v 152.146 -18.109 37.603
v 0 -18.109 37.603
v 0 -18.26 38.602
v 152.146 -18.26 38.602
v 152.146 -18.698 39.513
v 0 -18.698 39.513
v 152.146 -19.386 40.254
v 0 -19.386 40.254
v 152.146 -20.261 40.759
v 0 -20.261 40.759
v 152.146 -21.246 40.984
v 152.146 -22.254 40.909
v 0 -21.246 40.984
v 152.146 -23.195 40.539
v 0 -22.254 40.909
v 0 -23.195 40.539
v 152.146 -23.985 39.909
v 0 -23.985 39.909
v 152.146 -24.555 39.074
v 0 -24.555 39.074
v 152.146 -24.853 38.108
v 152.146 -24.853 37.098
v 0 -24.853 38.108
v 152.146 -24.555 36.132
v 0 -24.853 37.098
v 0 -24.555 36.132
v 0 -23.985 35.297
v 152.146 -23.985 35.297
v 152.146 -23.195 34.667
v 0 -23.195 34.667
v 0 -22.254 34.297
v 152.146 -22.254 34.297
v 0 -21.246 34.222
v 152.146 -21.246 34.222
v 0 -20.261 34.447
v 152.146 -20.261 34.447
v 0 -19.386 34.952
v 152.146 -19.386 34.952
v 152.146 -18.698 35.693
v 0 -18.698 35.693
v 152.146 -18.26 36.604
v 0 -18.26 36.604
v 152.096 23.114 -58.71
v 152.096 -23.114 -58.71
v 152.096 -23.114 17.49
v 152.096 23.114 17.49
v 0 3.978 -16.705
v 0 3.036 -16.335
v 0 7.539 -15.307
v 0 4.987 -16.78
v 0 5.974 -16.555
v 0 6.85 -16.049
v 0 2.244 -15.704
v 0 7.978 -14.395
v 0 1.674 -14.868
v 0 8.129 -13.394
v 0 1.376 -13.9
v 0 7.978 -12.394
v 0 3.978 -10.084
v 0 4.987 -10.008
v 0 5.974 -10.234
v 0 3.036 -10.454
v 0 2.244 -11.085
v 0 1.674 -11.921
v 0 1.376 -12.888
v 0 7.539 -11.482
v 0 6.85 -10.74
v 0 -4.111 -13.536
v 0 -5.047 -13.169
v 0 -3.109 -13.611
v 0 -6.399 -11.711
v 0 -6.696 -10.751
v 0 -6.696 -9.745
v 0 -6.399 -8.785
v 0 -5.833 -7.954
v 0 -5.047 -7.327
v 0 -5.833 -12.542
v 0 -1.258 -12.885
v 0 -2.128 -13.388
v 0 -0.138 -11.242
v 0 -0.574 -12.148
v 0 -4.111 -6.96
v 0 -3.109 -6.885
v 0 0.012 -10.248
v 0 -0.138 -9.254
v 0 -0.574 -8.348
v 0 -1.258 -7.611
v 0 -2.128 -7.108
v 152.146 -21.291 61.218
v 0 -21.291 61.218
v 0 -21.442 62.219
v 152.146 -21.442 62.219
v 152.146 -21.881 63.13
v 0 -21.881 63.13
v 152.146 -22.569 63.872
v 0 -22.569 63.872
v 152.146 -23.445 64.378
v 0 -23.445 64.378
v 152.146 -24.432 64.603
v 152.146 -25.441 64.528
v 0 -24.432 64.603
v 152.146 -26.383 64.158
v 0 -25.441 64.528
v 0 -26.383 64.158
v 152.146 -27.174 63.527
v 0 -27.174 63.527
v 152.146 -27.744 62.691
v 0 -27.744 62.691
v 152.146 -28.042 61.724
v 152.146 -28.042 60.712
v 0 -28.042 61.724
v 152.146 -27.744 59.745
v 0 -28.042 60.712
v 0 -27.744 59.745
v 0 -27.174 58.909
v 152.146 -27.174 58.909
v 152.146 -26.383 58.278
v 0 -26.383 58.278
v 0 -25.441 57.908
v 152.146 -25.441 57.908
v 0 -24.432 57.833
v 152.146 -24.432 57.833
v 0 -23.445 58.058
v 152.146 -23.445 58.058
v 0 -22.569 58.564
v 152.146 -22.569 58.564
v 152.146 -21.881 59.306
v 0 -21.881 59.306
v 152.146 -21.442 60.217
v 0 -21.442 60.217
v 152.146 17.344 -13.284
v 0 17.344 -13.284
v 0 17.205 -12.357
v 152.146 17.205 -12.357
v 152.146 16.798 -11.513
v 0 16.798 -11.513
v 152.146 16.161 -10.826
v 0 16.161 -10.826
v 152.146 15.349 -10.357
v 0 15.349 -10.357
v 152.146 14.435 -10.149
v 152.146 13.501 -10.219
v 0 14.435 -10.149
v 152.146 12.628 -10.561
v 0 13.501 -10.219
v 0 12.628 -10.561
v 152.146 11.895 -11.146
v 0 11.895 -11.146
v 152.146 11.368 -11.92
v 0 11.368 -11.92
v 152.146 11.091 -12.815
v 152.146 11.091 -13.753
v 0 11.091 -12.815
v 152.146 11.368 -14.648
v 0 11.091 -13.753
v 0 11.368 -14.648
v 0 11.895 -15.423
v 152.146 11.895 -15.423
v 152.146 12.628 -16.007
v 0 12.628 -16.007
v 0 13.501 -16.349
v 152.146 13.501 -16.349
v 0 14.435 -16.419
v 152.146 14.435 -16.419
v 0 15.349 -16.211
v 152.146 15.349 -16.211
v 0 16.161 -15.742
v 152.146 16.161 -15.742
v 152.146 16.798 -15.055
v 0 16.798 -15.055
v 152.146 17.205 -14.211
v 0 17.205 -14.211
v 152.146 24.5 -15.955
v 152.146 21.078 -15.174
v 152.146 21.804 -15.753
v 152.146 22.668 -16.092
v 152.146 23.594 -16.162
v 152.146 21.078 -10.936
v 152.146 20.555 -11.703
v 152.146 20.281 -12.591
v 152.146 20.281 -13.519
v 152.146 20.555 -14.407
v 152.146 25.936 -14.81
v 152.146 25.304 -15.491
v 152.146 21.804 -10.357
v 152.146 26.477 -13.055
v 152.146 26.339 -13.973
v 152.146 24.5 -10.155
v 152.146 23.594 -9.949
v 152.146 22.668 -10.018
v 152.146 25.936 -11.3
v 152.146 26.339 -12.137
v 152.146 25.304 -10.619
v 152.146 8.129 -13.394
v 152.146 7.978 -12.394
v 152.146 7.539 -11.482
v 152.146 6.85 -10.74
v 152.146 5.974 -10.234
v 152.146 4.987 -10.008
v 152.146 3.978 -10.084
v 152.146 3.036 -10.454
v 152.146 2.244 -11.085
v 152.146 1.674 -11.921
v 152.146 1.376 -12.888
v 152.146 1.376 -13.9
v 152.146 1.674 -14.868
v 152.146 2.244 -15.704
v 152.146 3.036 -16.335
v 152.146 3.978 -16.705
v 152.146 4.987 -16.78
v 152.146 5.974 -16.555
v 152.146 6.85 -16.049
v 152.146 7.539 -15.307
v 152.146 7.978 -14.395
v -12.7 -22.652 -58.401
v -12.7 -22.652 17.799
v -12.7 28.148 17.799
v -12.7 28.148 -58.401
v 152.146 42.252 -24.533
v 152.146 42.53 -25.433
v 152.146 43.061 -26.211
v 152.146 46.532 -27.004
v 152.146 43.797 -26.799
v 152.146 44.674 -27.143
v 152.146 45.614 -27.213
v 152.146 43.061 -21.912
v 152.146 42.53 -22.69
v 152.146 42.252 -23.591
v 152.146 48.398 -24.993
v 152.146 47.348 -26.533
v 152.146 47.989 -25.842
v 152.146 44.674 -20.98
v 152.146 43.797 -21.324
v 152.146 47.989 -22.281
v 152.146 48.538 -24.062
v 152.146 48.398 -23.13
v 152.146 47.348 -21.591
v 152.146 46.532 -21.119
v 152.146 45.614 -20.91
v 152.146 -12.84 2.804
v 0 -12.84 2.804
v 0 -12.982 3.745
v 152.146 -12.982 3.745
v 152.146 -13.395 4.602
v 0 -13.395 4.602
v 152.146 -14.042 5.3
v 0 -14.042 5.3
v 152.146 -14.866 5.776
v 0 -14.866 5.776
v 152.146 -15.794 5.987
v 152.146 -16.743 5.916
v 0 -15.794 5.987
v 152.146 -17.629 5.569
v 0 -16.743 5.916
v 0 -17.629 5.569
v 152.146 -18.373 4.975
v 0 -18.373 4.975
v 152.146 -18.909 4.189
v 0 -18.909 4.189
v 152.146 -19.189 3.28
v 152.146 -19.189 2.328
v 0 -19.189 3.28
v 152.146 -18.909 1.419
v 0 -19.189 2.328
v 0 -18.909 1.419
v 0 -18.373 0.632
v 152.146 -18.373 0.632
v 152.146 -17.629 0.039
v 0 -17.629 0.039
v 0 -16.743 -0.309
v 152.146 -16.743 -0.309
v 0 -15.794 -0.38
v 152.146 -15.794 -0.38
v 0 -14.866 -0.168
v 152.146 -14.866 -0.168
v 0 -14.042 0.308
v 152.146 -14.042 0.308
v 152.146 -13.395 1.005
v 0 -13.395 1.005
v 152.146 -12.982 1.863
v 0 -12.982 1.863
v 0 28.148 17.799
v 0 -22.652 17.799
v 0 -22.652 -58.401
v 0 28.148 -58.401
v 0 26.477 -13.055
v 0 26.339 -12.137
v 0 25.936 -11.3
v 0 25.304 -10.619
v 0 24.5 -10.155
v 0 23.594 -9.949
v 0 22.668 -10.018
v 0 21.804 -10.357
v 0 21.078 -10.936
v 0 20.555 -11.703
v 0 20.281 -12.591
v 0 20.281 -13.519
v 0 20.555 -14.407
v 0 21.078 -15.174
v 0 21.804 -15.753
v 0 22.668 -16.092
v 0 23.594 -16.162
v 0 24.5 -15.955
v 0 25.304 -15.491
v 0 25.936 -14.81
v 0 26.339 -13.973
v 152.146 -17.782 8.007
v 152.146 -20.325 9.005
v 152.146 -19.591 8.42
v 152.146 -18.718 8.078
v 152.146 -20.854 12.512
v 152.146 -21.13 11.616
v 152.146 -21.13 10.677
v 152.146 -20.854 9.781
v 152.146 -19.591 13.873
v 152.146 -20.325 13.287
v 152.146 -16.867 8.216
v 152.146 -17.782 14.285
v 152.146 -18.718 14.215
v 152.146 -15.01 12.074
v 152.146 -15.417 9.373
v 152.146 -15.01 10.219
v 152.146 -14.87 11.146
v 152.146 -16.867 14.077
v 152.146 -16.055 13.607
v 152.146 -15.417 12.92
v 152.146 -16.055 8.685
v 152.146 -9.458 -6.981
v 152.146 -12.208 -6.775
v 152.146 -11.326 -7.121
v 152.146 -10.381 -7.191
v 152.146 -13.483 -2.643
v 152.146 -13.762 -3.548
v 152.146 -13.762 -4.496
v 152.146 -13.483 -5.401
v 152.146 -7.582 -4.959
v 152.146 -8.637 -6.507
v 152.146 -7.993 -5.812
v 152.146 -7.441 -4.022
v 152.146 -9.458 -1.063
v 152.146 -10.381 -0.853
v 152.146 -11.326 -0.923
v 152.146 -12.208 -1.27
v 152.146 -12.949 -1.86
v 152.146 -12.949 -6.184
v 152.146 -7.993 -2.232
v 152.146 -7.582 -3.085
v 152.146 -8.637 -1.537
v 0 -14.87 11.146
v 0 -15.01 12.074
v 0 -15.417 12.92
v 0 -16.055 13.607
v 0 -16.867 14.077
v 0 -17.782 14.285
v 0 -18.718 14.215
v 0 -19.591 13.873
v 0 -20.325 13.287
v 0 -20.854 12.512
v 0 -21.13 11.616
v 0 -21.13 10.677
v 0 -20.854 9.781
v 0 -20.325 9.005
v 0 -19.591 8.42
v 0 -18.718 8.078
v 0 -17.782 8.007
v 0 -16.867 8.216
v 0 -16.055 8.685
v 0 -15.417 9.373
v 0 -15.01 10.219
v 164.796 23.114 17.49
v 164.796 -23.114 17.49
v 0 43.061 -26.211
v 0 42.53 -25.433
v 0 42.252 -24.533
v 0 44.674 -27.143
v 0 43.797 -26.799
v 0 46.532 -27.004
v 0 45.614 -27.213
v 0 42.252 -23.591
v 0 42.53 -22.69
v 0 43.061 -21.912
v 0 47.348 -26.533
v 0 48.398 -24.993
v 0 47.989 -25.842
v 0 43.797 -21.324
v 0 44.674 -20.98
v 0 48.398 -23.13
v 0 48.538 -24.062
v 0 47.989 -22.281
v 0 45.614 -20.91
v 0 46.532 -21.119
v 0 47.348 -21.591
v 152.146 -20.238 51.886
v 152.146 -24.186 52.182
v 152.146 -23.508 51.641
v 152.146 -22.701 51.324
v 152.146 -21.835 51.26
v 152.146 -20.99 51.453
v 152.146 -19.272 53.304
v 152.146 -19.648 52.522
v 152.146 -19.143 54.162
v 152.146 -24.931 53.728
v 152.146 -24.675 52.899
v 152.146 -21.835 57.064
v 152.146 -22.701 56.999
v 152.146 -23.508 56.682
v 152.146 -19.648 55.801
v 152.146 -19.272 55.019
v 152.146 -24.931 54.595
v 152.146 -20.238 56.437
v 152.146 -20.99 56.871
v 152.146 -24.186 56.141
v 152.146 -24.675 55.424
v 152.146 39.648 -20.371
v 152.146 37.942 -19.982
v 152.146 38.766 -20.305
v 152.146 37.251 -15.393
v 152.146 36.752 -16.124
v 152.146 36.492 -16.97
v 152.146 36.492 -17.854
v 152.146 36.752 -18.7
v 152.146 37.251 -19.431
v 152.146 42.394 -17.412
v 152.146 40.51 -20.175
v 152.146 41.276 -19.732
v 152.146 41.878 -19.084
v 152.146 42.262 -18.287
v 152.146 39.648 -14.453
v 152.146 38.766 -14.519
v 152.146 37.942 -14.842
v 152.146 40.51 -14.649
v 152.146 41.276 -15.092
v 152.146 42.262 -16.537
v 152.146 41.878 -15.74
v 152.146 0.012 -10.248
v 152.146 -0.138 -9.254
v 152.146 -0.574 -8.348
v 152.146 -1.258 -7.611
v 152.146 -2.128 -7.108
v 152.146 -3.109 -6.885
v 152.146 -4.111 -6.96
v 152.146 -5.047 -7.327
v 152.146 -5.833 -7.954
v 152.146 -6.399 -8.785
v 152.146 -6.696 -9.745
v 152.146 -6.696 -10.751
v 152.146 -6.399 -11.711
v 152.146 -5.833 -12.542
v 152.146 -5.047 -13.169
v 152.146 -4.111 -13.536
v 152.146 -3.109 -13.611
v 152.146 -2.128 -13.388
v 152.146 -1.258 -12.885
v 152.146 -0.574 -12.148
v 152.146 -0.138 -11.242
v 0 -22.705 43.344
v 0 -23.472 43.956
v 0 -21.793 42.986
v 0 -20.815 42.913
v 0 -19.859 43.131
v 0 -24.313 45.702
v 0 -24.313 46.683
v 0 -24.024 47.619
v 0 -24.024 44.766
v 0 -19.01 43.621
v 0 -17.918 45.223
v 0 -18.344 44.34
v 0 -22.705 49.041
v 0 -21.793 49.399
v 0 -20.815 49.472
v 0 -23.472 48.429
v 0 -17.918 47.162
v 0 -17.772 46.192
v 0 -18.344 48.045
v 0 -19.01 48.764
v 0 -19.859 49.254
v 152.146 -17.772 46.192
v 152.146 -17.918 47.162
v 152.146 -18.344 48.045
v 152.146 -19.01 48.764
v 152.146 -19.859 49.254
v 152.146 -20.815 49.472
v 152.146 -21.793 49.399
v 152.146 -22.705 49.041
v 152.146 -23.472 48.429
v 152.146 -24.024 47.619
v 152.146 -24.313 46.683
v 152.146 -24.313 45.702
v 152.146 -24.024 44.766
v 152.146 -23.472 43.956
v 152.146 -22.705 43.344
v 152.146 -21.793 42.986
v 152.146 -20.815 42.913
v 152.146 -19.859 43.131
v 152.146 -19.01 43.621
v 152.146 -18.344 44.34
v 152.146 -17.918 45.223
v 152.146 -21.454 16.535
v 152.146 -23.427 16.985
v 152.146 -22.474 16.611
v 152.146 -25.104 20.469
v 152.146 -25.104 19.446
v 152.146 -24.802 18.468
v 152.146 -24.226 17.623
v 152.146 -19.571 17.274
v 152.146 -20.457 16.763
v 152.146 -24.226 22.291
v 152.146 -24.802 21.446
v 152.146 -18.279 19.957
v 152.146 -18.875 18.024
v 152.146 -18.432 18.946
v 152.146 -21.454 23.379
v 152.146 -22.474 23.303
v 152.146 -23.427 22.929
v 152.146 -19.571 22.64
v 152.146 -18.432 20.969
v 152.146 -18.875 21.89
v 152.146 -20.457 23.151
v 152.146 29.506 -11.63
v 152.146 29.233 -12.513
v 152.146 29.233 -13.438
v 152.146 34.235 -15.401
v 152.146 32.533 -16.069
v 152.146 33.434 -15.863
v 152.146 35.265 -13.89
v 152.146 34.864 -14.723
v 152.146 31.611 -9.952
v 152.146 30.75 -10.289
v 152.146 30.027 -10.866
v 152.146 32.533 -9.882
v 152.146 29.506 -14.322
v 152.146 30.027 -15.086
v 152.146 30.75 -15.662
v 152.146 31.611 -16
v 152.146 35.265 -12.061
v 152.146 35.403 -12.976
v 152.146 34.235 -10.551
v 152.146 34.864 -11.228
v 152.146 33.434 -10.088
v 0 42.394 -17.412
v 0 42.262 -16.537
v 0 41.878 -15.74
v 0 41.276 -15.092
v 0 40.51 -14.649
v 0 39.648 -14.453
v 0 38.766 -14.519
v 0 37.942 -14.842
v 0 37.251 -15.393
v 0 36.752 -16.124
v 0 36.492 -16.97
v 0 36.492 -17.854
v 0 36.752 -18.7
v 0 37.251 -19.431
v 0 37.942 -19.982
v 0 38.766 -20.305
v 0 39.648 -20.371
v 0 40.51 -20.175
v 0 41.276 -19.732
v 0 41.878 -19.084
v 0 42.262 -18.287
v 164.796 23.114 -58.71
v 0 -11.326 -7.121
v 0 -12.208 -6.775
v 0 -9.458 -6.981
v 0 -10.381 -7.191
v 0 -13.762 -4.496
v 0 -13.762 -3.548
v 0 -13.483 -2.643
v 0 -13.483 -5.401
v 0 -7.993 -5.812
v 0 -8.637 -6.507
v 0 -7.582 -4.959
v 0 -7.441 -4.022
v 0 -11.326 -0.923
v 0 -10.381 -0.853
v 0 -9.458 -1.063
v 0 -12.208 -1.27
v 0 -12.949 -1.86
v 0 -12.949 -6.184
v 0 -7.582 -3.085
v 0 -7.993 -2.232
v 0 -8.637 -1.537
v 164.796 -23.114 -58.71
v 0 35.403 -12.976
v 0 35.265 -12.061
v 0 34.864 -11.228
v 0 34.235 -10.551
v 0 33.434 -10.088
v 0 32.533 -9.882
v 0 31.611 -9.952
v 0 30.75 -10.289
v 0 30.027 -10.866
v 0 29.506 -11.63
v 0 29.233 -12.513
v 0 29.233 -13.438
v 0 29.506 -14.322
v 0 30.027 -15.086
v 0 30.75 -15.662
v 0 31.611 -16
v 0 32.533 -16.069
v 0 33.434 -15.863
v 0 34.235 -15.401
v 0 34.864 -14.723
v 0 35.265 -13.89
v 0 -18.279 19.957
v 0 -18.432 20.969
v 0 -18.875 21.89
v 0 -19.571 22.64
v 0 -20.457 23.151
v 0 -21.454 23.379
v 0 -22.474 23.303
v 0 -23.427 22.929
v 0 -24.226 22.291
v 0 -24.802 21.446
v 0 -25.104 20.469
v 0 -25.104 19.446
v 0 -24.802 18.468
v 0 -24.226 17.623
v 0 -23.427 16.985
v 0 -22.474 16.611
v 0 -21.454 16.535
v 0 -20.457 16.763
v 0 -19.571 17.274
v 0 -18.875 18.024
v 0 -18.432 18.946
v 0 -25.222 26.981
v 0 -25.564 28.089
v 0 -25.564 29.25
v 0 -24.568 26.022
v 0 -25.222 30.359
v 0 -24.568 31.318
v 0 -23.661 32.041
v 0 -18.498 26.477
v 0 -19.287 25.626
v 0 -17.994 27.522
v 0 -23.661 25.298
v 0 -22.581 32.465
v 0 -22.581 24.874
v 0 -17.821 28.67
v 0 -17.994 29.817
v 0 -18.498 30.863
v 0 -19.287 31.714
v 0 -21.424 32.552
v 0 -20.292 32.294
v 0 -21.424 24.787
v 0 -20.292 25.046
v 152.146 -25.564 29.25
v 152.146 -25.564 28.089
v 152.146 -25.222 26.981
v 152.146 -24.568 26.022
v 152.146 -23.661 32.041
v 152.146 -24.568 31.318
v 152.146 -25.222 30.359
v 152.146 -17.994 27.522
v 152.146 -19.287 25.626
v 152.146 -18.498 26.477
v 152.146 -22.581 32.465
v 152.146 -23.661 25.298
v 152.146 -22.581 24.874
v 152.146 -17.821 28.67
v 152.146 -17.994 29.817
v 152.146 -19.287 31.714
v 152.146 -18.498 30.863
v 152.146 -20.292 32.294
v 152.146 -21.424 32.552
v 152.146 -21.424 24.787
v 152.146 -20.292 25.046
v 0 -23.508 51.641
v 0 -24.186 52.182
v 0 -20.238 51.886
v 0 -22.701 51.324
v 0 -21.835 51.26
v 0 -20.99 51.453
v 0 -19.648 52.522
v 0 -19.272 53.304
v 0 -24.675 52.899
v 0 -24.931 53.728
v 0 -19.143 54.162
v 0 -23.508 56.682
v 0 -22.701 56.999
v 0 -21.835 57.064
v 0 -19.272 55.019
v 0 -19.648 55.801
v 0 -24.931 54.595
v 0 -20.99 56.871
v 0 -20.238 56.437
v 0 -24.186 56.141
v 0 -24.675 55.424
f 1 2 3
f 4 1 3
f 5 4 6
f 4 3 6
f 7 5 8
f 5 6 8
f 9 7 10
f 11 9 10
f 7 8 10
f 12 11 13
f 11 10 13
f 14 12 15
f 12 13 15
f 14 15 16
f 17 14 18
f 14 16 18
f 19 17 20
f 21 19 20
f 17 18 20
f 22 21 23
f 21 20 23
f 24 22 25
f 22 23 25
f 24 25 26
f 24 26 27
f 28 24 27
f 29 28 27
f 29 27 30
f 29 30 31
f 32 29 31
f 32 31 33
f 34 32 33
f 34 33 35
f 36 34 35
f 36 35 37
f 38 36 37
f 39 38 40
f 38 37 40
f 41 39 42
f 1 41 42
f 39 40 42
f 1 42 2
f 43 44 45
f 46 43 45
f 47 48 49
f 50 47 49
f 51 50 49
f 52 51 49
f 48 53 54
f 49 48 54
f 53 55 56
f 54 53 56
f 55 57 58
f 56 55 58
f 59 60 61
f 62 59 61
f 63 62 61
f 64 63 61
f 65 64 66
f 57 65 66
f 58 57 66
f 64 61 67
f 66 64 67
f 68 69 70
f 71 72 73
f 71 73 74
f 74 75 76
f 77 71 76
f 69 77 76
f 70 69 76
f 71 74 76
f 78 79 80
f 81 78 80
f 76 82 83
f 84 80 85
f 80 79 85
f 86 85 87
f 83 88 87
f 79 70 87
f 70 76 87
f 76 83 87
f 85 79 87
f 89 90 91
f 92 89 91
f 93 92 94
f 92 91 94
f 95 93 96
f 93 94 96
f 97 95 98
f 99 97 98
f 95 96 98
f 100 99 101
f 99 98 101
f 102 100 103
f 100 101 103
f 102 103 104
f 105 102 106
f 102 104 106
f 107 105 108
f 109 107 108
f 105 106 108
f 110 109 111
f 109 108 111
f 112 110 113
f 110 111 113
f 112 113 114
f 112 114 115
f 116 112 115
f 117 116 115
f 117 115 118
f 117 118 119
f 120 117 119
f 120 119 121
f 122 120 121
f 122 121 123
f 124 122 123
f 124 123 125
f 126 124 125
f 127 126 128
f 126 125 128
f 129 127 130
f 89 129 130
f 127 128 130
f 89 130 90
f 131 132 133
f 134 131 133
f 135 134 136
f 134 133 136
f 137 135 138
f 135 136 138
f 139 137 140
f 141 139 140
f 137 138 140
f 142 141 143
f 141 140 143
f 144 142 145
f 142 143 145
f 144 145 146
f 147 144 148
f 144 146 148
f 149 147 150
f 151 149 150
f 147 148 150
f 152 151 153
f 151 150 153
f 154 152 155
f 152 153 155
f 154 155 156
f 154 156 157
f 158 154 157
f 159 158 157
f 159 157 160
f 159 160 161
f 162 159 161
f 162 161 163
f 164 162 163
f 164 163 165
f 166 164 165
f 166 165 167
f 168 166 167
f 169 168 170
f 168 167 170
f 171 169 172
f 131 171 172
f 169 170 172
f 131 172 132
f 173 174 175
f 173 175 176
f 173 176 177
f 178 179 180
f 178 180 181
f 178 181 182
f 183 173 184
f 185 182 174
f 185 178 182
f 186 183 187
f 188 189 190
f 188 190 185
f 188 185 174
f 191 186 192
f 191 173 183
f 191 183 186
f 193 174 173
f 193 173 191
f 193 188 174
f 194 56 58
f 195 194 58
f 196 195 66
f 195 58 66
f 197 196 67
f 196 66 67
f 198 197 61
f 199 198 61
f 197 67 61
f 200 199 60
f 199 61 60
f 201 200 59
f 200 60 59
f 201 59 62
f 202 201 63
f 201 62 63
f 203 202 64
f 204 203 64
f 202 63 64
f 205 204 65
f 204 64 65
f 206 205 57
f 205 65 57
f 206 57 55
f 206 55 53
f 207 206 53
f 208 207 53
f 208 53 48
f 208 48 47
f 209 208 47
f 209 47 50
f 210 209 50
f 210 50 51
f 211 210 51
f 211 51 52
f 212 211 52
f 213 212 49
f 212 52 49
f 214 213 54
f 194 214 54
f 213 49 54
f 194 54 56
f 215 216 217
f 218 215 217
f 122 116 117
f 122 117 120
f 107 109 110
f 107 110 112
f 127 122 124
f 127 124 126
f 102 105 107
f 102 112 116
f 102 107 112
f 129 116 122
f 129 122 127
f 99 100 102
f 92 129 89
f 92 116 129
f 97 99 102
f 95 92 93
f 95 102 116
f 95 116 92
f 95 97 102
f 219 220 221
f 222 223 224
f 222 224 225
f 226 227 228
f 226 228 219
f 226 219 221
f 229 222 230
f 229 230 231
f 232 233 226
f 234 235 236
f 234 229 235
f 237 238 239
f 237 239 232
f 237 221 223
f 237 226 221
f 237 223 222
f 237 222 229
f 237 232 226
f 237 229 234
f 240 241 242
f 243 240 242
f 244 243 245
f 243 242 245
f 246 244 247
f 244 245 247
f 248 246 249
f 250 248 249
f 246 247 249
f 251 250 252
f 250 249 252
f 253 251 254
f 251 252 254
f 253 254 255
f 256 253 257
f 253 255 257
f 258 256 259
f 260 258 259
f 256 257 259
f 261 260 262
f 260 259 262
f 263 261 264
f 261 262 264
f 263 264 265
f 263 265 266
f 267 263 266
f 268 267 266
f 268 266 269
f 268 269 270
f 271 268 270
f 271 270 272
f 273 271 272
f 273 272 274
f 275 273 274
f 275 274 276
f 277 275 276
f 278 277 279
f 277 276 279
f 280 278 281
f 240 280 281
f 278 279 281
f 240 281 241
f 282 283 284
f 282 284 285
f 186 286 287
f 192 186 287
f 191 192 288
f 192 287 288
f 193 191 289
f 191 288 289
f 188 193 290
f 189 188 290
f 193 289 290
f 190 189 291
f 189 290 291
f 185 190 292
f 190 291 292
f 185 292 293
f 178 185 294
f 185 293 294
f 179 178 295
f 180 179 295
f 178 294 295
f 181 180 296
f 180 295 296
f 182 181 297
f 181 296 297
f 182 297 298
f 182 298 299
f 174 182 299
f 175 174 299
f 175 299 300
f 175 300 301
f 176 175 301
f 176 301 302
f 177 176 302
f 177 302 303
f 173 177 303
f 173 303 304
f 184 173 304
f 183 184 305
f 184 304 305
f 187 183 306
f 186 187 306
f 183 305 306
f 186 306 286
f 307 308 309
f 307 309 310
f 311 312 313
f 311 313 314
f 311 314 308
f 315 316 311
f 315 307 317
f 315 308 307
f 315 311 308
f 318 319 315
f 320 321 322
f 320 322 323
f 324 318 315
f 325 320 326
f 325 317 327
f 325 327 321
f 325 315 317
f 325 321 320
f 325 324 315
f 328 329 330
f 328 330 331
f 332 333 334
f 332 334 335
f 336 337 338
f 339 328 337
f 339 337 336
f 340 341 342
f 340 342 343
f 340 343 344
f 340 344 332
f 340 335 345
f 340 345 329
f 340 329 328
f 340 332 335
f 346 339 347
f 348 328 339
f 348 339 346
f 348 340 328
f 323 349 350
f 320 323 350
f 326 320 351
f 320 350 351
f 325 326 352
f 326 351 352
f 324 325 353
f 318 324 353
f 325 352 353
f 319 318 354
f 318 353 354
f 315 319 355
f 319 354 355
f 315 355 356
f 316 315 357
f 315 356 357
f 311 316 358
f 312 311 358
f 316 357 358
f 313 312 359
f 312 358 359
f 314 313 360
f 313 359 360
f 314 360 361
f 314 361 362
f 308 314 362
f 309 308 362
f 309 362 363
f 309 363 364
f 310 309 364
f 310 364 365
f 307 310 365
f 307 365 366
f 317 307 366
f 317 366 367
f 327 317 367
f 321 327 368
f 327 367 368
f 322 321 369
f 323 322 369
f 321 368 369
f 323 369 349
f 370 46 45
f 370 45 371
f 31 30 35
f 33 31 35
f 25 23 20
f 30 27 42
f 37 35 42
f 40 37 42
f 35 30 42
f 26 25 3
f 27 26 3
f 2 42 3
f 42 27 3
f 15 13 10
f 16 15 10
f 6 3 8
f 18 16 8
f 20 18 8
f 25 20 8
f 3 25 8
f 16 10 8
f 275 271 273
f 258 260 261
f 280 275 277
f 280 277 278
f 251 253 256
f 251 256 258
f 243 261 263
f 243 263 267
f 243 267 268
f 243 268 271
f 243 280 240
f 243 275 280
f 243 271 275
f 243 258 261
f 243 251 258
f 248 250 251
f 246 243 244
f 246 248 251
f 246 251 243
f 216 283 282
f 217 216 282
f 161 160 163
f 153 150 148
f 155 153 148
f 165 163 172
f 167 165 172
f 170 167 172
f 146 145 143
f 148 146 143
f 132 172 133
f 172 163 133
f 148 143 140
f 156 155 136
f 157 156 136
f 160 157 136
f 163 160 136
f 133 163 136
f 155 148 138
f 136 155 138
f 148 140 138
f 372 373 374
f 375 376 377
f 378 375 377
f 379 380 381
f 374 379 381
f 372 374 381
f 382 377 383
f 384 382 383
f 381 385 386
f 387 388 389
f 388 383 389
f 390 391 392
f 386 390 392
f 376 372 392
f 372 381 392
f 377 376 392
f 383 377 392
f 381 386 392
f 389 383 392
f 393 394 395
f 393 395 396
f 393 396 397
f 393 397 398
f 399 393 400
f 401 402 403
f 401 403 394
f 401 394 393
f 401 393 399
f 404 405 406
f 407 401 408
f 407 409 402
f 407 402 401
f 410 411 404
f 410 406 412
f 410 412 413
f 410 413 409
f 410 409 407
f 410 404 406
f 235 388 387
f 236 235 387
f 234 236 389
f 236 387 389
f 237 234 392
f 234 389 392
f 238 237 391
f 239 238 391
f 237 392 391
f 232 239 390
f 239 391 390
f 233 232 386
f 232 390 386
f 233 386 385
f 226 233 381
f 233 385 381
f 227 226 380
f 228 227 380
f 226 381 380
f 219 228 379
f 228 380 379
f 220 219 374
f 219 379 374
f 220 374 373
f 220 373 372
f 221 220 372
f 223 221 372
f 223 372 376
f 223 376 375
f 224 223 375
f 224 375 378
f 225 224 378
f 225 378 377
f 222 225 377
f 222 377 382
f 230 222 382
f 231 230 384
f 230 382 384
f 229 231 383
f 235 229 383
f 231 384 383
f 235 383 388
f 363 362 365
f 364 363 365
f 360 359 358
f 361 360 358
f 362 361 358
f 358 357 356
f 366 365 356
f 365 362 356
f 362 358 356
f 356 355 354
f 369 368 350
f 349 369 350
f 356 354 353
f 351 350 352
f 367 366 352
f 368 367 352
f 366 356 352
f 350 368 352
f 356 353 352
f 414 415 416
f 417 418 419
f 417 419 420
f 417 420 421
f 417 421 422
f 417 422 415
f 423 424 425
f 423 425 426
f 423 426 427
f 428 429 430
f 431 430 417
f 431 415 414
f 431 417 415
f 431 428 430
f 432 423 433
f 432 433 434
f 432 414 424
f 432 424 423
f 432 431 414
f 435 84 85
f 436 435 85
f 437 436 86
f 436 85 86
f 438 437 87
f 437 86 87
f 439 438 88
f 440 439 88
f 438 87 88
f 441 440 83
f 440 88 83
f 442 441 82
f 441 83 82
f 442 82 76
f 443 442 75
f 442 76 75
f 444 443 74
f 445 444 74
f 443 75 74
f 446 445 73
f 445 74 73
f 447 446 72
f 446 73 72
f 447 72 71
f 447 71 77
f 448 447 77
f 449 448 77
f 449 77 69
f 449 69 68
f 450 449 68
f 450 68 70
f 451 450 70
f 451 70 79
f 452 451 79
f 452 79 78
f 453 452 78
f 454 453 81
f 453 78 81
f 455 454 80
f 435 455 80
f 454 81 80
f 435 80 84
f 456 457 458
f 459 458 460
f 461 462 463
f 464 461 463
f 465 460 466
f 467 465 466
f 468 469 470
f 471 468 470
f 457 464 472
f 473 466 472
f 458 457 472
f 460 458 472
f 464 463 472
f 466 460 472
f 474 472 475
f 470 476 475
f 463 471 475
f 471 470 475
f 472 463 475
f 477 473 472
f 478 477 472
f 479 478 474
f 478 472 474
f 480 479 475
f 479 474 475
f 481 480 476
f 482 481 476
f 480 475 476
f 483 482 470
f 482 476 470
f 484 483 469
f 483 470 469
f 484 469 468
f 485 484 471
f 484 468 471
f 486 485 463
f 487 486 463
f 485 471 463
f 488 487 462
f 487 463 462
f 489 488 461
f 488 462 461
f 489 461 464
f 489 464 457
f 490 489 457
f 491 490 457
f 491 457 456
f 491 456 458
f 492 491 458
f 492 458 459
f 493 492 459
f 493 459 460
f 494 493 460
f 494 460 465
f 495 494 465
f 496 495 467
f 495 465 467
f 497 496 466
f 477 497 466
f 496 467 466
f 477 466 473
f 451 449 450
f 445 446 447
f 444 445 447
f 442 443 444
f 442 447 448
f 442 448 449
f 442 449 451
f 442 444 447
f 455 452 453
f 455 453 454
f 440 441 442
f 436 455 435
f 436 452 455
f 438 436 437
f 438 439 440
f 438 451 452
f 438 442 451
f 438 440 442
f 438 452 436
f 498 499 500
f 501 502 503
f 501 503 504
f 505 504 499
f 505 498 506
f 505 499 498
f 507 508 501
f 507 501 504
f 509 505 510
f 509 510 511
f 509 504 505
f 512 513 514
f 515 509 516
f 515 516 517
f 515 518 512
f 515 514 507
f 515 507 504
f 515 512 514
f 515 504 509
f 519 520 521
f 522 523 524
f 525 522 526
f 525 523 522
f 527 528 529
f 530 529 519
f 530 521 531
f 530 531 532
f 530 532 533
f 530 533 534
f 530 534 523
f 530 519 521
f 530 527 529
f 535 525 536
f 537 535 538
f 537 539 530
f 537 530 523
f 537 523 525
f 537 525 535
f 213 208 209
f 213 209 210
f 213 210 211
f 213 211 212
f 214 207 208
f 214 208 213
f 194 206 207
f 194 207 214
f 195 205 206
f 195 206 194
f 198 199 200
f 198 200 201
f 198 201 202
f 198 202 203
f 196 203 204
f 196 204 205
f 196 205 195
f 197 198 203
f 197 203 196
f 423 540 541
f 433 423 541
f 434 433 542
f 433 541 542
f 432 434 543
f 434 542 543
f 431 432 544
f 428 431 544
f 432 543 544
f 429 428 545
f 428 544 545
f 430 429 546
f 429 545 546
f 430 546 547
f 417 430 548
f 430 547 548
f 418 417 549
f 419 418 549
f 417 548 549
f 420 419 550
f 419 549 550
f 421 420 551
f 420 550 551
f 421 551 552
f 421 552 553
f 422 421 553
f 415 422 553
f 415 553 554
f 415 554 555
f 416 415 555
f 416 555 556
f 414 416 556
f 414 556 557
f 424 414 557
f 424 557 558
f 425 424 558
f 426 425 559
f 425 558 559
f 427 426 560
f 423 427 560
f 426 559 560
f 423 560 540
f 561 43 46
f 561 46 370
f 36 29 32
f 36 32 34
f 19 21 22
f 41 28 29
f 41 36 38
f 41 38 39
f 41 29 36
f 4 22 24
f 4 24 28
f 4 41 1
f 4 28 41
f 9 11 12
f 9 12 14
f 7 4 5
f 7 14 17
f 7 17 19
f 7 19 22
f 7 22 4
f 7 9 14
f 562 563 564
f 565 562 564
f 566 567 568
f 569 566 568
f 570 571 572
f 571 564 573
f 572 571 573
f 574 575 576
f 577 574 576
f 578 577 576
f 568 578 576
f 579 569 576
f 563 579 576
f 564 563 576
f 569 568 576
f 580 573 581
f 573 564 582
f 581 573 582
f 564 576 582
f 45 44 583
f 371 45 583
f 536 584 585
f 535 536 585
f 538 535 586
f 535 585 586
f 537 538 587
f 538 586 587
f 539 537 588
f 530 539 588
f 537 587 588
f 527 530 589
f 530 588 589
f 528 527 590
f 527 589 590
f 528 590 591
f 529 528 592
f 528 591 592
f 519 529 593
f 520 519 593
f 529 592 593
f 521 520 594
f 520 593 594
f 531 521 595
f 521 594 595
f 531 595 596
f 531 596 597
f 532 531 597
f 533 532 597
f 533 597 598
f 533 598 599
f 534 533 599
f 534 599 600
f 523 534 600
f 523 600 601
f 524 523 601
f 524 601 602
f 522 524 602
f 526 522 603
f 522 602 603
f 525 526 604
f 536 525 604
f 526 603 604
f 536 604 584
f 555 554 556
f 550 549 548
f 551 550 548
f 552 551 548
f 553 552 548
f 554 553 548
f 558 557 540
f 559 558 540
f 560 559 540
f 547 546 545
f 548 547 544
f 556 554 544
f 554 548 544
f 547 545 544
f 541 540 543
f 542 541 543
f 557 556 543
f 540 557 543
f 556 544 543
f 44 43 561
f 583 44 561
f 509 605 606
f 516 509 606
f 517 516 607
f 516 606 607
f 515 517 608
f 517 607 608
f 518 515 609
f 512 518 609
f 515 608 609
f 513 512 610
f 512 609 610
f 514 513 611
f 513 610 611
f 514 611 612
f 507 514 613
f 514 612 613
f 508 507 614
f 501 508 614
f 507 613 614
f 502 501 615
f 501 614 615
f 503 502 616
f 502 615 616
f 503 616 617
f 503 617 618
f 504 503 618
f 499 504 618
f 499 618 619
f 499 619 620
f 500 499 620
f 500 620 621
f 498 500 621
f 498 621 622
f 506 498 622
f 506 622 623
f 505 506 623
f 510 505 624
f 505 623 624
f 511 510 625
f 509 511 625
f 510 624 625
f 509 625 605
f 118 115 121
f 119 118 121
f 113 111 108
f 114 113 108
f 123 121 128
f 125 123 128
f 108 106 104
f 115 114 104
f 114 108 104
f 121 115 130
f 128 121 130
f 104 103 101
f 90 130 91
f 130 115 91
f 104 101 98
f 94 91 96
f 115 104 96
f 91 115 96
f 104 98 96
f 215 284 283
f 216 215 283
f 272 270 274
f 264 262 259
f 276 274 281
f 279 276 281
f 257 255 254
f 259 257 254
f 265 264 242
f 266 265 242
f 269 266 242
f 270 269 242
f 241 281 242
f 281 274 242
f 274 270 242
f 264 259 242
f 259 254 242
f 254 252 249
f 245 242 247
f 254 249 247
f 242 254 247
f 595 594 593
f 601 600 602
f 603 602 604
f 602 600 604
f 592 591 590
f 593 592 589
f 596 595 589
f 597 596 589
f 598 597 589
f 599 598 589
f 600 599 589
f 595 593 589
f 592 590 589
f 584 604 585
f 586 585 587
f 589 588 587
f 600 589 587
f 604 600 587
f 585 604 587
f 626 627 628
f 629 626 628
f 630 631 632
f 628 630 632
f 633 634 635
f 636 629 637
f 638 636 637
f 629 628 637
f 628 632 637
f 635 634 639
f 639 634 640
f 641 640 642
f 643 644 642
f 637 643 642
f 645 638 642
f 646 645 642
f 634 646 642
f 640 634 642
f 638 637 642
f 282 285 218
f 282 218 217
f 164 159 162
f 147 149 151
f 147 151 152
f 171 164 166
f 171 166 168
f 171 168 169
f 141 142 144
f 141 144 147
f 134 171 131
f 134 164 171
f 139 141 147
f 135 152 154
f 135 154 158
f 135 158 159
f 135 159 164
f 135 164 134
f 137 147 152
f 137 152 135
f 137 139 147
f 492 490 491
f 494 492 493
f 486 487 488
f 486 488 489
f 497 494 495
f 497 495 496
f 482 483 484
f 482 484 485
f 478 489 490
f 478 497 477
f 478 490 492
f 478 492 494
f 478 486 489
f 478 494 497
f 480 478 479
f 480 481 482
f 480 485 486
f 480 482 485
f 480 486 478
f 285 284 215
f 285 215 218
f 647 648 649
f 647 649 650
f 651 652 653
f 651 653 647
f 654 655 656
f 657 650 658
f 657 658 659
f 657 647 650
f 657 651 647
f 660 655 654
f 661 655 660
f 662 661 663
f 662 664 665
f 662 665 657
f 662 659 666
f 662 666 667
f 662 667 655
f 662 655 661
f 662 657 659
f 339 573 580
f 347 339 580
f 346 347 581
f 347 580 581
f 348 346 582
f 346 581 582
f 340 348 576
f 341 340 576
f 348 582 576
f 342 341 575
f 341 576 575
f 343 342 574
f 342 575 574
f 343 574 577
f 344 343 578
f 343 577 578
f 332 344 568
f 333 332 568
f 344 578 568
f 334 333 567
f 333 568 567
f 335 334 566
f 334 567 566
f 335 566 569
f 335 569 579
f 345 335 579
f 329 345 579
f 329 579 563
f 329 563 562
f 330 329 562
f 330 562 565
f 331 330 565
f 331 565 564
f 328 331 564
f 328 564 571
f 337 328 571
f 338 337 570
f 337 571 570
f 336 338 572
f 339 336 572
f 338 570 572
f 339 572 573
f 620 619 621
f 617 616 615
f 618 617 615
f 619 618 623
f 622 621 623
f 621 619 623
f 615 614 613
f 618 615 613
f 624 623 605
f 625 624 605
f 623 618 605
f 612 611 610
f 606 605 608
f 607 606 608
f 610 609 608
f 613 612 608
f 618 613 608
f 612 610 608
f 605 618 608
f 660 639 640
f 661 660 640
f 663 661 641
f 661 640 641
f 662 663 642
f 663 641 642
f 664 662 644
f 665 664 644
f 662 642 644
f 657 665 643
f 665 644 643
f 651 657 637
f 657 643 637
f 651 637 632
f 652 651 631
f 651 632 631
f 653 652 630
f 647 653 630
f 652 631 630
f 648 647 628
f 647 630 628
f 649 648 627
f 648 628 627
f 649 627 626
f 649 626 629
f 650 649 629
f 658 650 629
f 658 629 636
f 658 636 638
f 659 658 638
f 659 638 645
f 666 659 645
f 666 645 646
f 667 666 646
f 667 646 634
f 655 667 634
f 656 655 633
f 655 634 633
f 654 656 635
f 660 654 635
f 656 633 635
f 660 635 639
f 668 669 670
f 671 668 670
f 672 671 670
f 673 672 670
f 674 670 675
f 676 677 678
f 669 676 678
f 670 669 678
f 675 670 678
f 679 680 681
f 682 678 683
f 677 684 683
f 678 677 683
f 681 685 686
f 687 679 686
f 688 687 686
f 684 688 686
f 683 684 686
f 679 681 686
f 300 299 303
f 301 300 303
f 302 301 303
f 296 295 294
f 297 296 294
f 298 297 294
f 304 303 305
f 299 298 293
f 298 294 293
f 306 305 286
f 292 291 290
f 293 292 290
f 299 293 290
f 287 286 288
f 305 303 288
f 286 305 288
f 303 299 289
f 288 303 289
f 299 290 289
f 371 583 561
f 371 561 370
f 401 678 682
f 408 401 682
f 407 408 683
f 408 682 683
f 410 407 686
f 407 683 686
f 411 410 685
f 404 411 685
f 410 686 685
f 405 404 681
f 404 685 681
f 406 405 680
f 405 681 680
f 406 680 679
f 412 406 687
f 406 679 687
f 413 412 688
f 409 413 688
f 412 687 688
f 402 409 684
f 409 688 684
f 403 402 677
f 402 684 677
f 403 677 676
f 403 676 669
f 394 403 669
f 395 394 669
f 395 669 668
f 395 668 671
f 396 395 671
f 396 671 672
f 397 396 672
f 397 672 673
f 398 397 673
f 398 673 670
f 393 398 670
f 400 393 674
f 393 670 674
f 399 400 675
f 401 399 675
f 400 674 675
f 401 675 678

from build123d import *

# Parameters (mm, degrees)
F0_R     = 3.16067
F0_R_2   = 2.96773
F0_R_3   = 3.102005
F0_R_4   = 3.115231
F0_R_5   = 3.144098
F0_R_6   = 3.395515
F0_R_7   = 3.372894
F0_R_8   = 3.178308
F0_R_9   = 3.192537
F0_R_10  = 3.147802
F0_R_11  = 3.43163
F0_R_12  = 3.89317
F0_R_13  = 3.390664
F0_R_14  = 3.288757
F0_R_15  = 2.910214
F0_R_16  = 3.39479
F1_DEPTH = 152.146
F2_W     = 50.8
F2_H     = 76.2
F3_DEPTH = 12.7
F4_W     = 12.7
F4_H     = 76.2
F5_DEPTH = 23.114


with BuildPart() as f1:
    # F0 (on Right) → F1 (new body)
    with BuildSketch(Plane.YZ):
        with Locations((45.377556, -24.061644)):
            Circle(F0_R)
        with Locations((39.426105, -17.412066)):
            Circle(F0_R_2)
        with Locations((32.300781, -12.975757)):
            Circle(F0_R_3)
        with Locations((23.361698, -13.055068)):
            Circle(F0_R_4)
        with Locations((14.200249, -13.284103)):
            Circle(F0_R_5)
        with Locations((4.733417, -13.39438)):
            Circle(F0_R_6)
        with Locations((-3.360607, -10.248034)):
            Circle(F0_R_7)
        with Locations((-10.618954, -4.022015)):
            Circle(F0_R_8)
        with Locations((-16.032538, 2.80372)):
            Circle(F0_R_9)
        with Locations((-18.017519, 11.146432)):
            Circle(F0_R_10)
        with Locations((-21.710697, 19.957051)):
            Circle(F0_R_11)
        with Locations((-21.714445, 28.669726)):
            Circle(F0_R_12)
        with Locations((-21.499782, 37.602966)):
            Circle(F0_R_13)
        with Locations((-21.060925, 46.192451)):
            Circle(F0_R_14)
        with Locations((-22.052919, 54.161627)):
            Circle(F0_R_15)
        with Locations((-24.685545, 61.218007)):
            Circle(F0_R_16)
    extrude(amount=F1_DEPTH)


with BuildPart() as f3:
    # F2 (on Right) → F3 (new body)
    with BuildSketch(Plane.YZ):
        with Locations((2.748434, -20.30052)):
            Rectangle(F2_W, F2_H)
    extrude(amount=-F3_DEPTH)


with BuildPart() as f5:
    # F4 (on Front) → F5 (new body, symmetric)
    with BuildSketch(Plane.XZ):
        with Locations((158.446074, -20.610275)):
            Rectangle(F4_W, F4_H)
    extrude(amount=F5_DEPTH, both=True)


solid = Compound([f1.part, f3.part, f5.part])
